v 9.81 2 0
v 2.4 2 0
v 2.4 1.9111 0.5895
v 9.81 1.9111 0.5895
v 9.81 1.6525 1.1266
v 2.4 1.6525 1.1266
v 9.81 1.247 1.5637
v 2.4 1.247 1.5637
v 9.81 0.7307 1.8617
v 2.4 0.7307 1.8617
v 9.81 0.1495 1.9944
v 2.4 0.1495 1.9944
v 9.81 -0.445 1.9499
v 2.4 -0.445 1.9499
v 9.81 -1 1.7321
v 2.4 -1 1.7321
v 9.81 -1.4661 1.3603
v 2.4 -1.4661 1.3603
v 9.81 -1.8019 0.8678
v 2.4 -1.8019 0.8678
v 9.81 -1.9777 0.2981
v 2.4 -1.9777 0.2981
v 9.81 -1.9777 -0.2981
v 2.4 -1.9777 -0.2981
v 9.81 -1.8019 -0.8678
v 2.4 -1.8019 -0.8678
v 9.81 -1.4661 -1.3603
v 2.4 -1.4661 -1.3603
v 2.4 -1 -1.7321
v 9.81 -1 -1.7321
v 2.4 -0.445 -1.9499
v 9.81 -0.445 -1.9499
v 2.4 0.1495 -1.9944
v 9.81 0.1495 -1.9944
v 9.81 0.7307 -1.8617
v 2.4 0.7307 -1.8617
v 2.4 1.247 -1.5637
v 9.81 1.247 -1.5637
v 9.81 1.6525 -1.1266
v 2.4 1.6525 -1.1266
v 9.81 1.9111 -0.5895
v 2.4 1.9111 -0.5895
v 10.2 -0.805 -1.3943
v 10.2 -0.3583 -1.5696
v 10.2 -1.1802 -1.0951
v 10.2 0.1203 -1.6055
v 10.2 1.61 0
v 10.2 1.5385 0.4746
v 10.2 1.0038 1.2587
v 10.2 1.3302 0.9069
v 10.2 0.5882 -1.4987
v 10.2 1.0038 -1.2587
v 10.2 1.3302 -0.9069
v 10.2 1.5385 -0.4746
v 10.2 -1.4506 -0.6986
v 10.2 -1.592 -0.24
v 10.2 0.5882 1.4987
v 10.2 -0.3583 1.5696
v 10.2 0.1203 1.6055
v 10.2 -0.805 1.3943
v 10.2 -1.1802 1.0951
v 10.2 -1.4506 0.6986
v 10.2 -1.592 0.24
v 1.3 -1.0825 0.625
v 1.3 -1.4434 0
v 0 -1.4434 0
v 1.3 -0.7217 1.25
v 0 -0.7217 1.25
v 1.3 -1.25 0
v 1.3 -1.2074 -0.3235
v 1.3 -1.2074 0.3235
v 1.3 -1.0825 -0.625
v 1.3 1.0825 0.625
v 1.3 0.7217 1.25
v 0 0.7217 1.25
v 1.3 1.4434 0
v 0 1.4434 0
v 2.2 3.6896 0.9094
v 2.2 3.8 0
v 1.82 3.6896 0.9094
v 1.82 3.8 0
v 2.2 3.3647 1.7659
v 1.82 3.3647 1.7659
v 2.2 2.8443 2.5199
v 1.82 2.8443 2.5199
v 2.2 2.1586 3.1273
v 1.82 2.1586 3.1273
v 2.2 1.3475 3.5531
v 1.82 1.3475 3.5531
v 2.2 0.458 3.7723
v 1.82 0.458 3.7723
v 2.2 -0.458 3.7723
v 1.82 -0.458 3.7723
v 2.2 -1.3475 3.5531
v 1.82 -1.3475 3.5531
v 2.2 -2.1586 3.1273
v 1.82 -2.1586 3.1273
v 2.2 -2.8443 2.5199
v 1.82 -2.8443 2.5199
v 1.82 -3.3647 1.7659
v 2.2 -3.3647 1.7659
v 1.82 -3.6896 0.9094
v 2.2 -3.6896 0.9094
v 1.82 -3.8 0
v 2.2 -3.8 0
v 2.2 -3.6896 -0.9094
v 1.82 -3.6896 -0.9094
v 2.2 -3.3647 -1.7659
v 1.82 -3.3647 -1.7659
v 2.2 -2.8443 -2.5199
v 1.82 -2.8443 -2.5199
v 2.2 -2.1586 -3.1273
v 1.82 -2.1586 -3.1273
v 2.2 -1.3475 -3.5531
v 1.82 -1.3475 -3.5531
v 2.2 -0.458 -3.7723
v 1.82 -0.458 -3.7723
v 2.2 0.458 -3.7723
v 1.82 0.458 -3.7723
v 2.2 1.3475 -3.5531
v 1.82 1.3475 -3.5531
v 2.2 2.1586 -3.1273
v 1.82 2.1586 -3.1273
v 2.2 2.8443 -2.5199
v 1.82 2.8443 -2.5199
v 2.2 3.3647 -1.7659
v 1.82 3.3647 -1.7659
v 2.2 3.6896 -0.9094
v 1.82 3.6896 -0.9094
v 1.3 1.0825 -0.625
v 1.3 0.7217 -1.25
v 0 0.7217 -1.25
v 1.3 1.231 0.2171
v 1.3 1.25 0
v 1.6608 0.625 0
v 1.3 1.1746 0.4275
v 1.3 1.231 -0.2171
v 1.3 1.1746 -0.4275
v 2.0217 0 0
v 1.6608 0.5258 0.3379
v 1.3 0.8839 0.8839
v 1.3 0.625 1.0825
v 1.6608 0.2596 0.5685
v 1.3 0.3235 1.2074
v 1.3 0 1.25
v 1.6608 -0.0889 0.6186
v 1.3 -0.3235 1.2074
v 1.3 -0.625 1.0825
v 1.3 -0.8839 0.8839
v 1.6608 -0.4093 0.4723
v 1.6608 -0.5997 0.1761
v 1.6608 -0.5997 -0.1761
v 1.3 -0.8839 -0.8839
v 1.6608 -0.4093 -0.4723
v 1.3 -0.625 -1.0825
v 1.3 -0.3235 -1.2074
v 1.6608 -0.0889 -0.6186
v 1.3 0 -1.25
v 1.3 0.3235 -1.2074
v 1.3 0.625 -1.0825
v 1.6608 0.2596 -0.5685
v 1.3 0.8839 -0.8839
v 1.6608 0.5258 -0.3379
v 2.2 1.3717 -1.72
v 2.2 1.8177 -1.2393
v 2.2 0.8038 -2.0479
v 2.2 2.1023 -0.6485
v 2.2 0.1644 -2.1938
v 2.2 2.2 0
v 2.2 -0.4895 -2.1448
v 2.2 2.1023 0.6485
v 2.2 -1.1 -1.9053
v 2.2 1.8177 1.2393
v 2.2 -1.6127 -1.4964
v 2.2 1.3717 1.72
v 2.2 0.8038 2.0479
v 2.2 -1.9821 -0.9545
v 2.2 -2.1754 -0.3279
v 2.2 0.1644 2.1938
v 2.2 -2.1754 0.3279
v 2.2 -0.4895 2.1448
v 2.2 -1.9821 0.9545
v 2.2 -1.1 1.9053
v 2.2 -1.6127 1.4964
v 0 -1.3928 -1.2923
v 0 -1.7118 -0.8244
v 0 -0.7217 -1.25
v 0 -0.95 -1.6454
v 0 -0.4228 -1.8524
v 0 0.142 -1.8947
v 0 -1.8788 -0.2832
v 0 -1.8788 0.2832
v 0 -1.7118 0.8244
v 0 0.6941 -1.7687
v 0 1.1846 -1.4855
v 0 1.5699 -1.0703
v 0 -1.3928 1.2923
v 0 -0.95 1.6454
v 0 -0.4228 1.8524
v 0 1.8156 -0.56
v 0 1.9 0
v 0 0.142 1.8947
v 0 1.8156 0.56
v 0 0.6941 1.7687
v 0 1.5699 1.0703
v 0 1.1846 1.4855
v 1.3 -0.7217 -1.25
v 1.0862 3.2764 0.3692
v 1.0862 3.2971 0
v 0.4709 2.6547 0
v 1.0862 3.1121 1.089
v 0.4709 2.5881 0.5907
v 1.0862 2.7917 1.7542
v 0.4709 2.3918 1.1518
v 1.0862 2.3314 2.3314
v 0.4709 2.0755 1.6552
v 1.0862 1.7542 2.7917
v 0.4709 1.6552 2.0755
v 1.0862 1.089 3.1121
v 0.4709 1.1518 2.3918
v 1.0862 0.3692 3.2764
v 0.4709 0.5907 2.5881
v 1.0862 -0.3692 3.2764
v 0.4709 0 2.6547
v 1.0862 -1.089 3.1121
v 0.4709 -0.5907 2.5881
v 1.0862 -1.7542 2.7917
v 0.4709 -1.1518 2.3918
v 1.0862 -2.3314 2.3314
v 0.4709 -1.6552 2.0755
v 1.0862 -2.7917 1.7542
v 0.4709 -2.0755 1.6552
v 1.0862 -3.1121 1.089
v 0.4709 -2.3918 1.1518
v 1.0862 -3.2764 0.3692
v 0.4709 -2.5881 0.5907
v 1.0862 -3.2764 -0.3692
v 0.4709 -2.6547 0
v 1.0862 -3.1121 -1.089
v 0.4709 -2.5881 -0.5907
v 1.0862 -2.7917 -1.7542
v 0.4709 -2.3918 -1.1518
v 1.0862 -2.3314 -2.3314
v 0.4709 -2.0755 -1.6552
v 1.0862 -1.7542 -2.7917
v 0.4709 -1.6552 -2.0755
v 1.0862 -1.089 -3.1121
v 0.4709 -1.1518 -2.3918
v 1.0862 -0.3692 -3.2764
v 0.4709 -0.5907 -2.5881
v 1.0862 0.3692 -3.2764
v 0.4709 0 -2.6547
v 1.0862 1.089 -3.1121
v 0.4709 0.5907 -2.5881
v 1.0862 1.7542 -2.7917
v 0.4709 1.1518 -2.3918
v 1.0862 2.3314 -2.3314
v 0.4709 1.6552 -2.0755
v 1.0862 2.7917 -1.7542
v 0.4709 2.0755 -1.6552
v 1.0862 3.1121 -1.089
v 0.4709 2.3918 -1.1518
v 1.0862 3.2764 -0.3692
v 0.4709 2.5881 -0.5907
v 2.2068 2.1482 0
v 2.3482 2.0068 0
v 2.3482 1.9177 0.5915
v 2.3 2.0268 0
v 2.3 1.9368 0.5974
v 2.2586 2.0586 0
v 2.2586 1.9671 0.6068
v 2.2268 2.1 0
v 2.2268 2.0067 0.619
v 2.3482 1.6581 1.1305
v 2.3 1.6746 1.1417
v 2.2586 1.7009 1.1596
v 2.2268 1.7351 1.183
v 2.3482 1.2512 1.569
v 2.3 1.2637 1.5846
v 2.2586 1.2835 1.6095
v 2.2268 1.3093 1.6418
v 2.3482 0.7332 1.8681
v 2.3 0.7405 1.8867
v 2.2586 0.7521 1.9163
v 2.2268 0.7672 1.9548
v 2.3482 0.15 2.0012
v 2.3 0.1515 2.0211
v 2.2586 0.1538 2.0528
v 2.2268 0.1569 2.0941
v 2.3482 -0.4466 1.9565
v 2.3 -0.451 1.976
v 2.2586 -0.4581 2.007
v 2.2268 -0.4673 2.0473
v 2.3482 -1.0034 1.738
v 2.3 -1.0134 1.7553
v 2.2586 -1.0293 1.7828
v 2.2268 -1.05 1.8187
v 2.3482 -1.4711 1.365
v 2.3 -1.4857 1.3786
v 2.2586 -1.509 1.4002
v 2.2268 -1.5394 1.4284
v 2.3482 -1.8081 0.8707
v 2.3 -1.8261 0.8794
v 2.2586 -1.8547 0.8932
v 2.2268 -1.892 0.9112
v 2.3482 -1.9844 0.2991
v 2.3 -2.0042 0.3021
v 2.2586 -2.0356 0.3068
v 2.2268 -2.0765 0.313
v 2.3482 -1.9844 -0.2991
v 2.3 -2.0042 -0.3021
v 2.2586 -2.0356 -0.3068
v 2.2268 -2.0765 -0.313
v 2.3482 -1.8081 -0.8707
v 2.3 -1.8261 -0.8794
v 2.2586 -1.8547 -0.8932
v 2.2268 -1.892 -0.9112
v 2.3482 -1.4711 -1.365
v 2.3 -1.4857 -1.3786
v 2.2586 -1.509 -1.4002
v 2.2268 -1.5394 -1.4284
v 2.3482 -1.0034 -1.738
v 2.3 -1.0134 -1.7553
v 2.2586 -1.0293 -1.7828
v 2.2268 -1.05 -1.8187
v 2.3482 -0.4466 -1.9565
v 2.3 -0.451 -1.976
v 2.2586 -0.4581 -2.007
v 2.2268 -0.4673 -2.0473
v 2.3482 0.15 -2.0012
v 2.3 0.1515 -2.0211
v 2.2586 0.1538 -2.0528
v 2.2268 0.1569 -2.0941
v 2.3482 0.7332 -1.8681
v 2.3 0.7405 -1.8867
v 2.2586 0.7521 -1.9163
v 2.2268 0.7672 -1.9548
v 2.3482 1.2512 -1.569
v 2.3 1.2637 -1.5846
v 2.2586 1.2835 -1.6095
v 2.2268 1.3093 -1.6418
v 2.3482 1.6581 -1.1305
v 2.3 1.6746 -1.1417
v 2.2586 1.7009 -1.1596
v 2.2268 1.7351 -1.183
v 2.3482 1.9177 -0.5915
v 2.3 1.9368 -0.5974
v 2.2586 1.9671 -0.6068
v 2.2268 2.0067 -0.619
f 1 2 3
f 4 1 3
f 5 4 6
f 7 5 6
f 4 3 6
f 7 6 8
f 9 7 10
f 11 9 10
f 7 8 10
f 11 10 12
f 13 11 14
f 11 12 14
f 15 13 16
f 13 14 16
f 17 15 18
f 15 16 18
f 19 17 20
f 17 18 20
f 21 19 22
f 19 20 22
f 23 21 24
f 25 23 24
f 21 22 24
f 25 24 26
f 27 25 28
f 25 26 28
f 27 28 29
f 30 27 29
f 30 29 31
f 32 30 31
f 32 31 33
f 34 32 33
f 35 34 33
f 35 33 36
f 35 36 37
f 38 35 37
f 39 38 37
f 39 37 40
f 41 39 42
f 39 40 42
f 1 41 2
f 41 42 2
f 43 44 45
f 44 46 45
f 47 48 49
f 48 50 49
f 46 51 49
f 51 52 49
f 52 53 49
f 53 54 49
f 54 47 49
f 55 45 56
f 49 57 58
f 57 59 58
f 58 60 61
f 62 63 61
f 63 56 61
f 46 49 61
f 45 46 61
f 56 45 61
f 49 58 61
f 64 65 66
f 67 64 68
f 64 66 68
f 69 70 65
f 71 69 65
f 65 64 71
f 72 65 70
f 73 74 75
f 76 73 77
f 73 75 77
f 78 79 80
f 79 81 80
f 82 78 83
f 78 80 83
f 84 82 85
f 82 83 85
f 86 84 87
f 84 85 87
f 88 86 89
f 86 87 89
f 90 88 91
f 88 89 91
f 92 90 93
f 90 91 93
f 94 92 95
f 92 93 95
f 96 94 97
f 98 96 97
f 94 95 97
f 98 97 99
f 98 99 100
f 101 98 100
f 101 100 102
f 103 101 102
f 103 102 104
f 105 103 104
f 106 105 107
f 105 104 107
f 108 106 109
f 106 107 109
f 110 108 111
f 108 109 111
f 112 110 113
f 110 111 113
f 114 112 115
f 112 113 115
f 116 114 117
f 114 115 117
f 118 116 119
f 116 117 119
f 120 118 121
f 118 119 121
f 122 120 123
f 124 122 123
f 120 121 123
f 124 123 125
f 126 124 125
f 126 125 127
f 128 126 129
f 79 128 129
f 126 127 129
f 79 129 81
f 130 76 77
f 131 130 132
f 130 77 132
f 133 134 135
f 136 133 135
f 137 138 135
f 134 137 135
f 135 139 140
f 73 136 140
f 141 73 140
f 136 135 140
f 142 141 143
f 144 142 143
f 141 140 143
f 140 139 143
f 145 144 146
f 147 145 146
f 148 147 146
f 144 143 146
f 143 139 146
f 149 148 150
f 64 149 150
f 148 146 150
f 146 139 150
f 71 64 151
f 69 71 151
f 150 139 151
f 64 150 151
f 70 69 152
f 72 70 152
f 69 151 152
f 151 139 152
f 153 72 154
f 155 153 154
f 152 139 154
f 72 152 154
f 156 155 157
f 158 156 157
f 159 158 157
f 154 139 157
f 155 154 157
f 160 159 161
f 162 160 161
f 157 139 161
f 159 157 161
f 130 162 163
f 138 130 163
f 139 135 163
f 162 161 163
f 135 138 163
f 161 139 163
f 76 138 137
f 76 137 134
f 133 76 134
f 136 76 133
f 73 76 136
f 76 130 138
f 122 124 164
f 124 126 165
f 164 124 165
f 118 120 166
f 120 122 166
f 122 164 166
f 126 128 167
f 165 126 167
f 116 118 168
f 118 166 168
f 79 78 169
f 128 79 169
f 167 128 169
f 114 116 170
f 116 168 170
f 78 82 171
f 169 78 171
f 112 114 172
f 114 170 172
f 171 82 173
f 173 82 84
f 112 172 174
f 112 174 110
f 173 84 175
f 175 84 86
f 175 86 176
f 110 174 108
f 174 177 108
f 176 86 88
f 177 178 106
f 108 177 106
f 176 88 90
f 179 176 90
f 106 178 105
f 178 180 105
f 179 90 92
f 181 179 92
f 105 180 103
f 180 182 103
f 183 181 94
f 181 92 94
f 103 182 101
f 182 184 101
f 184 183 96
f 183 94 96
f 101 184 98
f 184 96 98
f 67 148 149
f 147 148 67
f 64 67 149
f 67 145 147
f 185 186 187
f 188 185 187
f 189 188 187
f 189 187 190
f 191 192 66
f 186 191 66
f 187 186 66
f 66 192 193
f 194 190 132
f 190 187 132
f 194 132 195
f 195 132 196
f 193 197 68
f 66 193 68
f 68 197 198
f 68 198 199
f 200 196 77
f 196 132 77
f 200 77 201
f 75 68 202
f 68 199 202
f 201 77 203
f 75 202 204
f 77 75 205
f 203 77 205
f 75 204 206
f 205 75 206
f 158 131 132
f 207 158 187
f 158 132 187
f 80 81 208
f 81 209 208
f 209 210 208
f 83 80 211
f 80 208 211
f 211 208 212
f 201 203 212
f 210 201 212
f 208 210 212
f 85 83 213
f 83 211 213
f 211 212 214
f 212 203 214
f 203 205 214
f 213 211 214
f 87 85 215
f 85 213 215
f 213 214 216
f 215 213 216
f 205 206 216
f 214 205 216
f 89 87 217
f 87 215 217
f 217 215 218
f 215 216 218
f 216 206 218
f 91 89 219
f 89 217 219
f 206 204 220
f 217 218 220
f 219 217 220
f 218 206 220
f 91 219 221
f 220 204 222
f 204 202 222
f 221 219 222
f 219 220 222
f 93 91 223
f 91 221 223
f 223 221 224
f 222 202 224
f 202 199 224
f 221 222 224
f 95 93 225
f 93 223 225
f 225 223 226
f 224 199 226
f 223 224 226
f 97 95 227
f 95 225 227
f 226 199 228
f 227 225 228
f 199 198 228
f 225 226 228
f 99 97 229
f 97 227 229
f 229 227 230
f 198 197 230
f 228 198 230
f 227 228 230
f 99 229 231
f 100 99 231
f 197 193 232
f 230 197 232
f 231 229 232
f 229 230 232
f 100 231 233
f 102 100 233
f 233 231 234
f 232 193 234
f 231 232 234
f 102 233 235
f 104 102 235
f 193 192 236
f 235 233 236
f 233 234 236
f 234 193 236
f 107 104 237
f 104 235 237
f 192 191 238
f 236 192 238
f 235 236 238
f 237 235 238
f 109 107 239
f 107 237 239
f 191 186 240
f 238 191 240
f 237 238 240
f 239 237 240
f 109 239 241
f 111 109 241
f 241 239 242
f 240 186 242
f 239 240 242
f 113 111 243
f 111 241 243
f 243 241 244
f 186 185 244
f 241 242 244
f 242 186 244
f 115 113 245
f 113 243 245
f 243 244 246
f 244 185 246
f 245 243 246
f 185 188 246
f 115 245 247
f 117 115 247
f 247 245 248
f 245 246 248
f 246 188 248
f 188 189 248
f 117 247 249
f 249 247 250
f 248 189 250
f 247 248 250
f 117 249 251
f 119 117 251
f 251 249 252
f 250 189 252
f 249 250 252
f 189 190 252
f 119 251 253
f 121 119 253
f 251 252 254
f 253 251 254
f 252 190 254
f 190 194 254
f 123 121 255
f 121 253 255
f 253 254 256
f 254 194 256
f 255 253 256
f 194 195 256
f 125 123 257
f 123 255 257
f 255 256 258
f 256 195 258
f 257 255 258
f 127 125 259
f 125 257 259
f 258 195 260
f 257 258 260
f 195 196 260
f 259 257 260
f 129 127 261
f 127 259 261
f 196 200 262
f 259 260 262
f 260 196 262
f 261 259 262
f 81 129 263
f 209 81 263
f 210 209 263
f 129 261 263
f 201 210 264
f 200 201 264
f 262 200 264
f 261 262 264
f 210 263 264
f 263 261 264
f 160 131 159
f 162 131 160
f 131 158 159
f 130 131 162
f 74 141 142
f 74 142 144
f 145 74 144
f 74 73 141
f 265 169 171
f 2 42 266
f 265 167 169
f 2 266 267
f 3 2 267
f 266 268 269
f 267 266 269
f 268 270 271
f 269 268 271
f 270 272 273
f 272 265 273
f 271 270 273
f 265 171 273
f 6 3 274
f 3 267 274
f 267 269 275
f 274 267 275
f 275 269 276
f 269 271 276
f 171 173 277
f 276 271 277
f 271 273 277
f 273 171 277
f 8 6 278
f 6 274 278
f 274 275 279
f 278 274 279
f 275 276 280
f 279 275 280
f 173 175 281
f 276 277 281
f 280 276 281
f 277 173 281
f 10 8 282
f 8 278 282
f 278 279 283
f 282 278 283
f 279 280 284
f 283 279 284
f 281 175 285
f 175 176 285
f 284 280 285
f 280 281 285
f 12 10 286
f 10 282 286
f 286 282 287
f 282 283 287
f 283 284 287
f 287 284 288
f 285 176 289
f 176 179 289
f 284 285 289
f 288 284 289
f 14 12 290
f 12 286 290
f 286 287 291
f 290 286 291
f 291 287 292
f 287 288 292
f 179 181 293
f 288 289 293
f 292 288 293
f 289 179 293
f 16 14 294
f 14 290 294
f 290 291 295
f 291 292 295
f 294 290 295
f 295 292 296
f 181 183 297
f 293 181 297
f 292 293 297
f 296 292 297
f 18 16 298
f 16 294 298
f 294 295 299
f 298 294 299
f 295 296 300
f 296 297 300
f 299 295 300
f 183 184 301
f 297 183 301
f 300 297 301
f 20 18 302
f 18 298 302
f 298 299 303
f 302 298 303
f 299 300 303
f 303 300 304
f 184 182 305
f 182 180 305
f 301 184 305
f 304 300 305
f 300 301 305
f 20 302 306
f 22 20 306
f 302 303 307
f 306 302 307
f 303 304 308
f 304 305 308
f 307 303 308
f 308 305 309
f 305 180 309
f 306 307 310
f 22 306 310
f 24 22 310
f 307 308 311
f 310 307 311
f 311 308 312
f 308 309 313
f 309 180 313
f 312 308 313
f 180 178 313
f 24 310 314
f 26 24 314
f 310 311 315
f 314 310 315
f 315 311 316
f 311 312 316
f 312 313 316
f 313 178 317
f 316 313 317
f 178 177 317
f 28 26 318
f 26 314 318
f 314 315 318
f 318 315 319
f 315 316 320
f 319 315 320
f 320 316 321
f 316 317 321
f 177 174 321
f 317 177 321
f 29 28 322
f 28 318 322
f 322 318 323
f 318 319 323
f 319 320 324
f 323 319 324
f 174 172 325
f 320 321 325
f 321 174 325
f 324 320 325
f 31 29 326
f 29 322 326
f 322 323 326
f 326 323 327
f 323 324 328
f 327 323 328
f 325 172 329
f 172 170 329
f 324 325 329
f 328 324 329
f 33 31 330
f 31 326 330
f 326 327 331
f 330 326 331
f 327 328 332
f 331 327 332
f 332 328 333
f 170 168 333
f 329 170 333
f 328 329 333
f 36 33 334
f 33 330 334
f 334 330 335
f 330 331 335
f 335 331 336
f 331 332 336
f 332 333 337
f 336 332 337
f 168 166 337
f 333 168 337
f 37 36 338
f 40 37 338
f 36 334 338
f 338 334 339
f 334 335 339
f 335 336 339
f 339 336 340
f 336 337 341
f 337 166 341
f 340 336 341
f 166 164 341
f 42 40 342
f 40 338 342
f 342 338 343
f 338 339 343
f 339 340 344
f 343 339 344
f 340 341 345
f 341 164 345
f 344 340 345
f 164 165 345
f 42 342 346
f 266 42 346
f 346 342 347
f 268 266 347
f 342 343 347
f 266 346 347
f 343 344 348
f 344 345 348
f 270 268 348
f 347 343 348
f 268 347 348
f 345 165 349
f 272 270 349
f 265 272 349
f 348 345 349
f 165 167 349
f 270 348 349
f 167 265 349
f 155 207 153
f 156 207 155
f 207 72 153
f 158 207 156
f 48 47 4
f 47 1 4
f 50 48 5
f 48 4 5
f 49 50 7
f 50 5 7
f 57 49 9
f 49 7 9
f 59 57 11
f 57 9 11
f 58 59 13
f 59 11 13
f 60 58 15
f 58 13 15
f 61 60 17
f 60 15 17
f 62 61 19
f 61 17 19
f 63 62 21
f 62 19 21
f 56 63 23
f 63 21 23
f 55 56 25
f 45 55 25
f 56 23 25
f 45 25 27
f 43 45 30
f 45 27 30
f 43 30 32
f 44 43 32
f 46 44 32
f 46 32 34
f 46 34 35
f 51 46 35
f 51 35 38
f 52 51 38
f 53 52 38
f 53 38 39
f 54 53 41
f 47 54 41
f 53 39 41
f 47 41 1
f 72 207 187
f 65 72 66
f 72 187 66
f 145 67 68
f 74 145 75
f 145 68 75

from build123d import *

# Parameters (mm, degrees)
FILLET1_R   = 0.2
HEX_2_DEPTH = 1.3


with BuildPart() as part:
    # BodySke → BaseBody (revolve)
    with BuildSketch(Plane.XY):
        with BuildLine():
            Line((10.2, 0), (10.2, 1.61))
            Line((10.2, 1.61), (9.81, 2))
            Line((9.81, 2), (2.2, 2))
            Line((2.2, 2), (2.2, 3.8))
            Line((2.2, 3.8), (1.82, 3.8))
            ThreePointArc((1.82, 3.8), (0.762013659, 2.991755338), (0, 1.9))
            Line((0, 1.9), (0, 0))
            Line((0, 0), (10.2, 0))
        make_face()
    revolve(axis=Axis((0, 0, 0), (1, 0, 0)))

    # Fillet1
    fillet1_edges = [part.edges().sort_by_distance(p)[0] for p in [
        (2.2, -2, 0),
    ]]
    fillet(fillet1_edges, radius=FILLET1_R)

    # Sketch2 → PreBroach (revolve, cut)
    with BuildSketch(Plane.XY):
        Polygon((0, 1.25), (1.3, 1.25), (2.021687836, 0), (0, 0), align=None)
    revolve(axis=Axis((0, 0, 0), (1, 0, 0)), mode=Mode.SUBTRACT)

    # Sketch3 → Hex 2 (cut)
    with BuildSketch(Plane(origin=(0, 0, 0), x_dir=(0, 0, -1), z_dir=(1, 0, 0))):
        Polygon((-1.25, -0.721687836), (-1.25, 0.721687836), (0, 1.443375673), (1.25, 0.721687836), (1.25, -0.721687836), (0, -1.443375673), align=None)
    extrude(amount=HEX_2_DEPTH, mode=Mode.SUBTRACT)


solid = part.part
